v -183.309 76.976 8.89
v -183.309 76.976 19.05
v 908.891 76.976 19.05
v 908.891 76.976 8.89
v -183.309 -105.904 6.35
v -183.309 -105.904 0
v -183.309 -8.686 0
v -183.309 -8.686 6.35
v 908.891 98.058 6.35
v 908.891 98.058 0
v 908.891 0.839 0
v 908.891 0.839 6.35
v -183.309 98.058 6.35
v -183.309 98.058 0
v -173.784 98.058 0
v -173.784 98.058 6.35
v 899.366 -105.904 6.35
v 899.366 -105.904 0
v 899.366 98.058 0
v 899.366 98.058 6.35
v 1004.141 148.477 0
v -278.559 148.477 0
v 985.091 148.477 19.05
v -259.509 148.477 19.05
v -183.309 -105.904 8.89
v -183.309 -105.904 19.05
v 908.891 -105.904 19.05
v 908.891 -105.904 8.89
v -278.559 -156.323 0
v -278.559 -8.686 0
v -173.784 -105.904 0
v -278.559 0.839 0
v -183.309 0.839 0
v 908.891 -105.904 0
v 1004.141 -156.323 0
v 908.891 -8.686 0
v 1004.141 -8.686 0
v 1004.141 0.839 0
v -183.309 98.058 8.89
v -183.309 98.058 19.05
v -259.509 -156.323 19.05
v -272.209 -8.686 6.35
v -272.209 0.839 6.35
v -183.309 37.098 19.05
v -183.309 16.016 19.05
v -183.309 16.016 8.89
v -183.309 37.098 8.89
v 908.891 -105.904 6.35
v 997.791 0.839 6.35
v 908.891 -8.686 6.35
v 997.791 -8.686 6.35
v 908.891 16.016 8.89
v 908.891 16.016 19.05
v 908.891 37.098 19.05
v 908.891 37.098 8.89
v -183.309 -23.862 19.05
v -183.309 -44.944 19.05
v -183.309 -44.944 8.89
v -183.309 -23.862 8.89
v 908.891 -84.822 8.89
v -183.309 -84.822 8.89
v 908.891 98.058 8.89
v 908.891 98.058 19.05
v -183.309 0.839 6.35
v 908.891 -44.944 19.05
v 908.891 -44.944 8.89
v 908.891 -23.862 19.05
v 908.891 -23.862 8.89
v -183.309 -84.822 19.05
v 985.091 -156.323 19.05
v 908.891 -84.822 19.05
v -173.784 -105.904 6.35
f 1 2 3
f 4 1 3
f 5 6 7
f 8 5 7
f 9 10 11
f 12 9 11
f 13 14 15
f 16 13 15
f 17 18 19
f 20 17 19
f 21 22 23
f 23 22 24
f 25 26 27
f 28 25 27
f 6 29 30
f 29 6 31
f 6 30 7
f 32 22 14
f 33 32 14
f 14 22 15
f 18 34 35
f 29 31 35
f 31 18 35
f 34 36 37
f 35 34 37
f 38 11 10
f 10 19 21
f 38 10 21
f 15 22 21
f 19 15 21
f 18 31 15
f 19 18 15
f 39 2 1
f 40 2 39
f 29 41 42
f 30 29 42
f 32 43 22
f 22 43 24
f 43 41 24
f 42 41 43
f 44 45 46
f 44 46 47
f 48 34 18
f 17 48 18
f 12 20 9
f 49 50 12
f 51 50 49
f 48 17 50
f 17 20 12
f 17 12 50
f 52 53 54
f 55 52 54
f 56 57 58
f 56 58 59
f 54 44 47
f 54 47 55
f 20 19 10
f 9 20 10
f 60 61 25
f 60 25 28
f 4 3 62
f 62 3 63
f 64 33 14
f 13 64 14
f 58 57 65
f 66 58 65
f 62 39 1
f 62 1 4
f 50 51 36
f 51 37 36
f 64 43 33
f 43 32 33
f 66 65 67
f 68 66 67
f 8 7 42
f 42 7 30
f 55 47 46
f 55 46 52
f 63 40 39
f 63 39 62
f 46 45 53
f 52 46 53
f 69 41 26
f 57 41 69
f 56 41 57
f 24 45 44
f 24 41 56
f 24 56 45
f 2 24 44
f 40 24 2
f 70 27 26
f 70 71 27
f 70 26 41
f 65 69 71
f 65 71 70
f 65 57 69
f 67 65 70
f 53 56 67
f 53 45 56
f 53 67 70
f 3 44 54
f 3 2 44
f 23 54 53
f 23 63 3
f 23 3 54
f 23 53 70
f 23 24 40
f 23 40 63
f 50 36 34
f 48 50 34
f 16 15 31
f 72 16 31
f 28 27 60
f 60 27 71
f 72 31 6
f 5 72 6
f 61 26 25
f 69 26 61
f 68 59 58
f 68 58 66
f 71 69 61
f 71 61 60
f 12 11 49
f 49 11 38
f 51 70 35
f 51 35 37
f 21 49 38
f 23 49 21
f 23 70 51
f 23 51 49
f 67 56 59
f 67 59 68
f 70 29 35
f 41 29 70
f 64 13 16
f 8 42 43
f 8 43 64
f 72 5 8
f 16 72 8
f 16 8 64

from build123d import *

# Parameters (mm, degrees)
F0_W     = 1282.7
F0_H     = 304.8
F1_DEPTH = 19.05
F2_SIZE  = 19.04999
F3_W     = 1092.2
F3_H     = 21.082
F4_DEPTH = 10.16
F6_DEPTH = 6.35


# Not quite as in the source:
# - a fillet or chamfer is up to 0.001 mm smaller than in the source, because OpenCascade refuses the exact size


with BuildPart() as f1:
    # F0 (on Top) → F1 (new body)
    with BuildSketch(Plane.XY):
        with Locations((362.7905342946, -3.9232242852)):
            Rectangle(F0_W, F0_H)
    extrude(amount=F1_DEPTH)

    # F2 (size 19.05 in the source; OpenCascade refuses exactly that, so slightly less here)
    f2_edges = [f1.edges().sort_by_distance(p)[0] for p in [
        (1004.140534, -3.923224, 19.05),
        (-278.559466, -3.923224, 19.05),
    ]]
    chamfer(f2_edges, length=F2_SIZE)

    # F3 (on face) → F4 (cut)
    with BuildSketch(Plane.XY.offset(19.05)):
        with Locations((362.7905342946, 87.5167757148)):
            Rectangle(F3_W, F3_H)
        with Locations((362.7905342946, 26.5567757148)):
            Rectangle(F3_W, F3_H)
        with Locations((362.7905342946, -34.4032242852)):
            Rectangle(F3_W, F3_H)
        with Locations((362.7905342946, -95.3632242852)):
            Rectangle(F3_W, F3_H)
    extrude(amount=-F4_DEPTH, mode=Mode.SUBTRACT)

    # F5 (on face) → F6 (cut)
    with BuildSketch(Plane(origin=(0, 0, 0), x_dir=(1, 0, 0), z_dir=(0, 0, -1))):
        Polygon((899.3655342946, 105.9042242852), (899.3655342946, -98.0577757148), (908.8905342946, -98.0577757148), (908.8905342946, -0.8392757148), (1004.1405342946, -0.8392757148), (1004.1405342946, 8.6857242852), (908.8905342946, 8.6857242852), (908.8905342946, 105.9042242852), align=None)
        Polygon((-278.5594657054, 8.6857242852), (-278.5594657054, -0.8392757148), (-183.3094657054, -0.8392757148), (-183.3094657054, -98.0577757148), (-173.7844657054, -98.0577757148), (-173.7844657054, 105.9042242852), (-183.3094657054, 105.9042242852), (-183.3094657054, 8.6857242852), align=None)
    extrude(amount=-F6_DEPTH, mode=Mode.SUBTRACT)


solid = f1.part
